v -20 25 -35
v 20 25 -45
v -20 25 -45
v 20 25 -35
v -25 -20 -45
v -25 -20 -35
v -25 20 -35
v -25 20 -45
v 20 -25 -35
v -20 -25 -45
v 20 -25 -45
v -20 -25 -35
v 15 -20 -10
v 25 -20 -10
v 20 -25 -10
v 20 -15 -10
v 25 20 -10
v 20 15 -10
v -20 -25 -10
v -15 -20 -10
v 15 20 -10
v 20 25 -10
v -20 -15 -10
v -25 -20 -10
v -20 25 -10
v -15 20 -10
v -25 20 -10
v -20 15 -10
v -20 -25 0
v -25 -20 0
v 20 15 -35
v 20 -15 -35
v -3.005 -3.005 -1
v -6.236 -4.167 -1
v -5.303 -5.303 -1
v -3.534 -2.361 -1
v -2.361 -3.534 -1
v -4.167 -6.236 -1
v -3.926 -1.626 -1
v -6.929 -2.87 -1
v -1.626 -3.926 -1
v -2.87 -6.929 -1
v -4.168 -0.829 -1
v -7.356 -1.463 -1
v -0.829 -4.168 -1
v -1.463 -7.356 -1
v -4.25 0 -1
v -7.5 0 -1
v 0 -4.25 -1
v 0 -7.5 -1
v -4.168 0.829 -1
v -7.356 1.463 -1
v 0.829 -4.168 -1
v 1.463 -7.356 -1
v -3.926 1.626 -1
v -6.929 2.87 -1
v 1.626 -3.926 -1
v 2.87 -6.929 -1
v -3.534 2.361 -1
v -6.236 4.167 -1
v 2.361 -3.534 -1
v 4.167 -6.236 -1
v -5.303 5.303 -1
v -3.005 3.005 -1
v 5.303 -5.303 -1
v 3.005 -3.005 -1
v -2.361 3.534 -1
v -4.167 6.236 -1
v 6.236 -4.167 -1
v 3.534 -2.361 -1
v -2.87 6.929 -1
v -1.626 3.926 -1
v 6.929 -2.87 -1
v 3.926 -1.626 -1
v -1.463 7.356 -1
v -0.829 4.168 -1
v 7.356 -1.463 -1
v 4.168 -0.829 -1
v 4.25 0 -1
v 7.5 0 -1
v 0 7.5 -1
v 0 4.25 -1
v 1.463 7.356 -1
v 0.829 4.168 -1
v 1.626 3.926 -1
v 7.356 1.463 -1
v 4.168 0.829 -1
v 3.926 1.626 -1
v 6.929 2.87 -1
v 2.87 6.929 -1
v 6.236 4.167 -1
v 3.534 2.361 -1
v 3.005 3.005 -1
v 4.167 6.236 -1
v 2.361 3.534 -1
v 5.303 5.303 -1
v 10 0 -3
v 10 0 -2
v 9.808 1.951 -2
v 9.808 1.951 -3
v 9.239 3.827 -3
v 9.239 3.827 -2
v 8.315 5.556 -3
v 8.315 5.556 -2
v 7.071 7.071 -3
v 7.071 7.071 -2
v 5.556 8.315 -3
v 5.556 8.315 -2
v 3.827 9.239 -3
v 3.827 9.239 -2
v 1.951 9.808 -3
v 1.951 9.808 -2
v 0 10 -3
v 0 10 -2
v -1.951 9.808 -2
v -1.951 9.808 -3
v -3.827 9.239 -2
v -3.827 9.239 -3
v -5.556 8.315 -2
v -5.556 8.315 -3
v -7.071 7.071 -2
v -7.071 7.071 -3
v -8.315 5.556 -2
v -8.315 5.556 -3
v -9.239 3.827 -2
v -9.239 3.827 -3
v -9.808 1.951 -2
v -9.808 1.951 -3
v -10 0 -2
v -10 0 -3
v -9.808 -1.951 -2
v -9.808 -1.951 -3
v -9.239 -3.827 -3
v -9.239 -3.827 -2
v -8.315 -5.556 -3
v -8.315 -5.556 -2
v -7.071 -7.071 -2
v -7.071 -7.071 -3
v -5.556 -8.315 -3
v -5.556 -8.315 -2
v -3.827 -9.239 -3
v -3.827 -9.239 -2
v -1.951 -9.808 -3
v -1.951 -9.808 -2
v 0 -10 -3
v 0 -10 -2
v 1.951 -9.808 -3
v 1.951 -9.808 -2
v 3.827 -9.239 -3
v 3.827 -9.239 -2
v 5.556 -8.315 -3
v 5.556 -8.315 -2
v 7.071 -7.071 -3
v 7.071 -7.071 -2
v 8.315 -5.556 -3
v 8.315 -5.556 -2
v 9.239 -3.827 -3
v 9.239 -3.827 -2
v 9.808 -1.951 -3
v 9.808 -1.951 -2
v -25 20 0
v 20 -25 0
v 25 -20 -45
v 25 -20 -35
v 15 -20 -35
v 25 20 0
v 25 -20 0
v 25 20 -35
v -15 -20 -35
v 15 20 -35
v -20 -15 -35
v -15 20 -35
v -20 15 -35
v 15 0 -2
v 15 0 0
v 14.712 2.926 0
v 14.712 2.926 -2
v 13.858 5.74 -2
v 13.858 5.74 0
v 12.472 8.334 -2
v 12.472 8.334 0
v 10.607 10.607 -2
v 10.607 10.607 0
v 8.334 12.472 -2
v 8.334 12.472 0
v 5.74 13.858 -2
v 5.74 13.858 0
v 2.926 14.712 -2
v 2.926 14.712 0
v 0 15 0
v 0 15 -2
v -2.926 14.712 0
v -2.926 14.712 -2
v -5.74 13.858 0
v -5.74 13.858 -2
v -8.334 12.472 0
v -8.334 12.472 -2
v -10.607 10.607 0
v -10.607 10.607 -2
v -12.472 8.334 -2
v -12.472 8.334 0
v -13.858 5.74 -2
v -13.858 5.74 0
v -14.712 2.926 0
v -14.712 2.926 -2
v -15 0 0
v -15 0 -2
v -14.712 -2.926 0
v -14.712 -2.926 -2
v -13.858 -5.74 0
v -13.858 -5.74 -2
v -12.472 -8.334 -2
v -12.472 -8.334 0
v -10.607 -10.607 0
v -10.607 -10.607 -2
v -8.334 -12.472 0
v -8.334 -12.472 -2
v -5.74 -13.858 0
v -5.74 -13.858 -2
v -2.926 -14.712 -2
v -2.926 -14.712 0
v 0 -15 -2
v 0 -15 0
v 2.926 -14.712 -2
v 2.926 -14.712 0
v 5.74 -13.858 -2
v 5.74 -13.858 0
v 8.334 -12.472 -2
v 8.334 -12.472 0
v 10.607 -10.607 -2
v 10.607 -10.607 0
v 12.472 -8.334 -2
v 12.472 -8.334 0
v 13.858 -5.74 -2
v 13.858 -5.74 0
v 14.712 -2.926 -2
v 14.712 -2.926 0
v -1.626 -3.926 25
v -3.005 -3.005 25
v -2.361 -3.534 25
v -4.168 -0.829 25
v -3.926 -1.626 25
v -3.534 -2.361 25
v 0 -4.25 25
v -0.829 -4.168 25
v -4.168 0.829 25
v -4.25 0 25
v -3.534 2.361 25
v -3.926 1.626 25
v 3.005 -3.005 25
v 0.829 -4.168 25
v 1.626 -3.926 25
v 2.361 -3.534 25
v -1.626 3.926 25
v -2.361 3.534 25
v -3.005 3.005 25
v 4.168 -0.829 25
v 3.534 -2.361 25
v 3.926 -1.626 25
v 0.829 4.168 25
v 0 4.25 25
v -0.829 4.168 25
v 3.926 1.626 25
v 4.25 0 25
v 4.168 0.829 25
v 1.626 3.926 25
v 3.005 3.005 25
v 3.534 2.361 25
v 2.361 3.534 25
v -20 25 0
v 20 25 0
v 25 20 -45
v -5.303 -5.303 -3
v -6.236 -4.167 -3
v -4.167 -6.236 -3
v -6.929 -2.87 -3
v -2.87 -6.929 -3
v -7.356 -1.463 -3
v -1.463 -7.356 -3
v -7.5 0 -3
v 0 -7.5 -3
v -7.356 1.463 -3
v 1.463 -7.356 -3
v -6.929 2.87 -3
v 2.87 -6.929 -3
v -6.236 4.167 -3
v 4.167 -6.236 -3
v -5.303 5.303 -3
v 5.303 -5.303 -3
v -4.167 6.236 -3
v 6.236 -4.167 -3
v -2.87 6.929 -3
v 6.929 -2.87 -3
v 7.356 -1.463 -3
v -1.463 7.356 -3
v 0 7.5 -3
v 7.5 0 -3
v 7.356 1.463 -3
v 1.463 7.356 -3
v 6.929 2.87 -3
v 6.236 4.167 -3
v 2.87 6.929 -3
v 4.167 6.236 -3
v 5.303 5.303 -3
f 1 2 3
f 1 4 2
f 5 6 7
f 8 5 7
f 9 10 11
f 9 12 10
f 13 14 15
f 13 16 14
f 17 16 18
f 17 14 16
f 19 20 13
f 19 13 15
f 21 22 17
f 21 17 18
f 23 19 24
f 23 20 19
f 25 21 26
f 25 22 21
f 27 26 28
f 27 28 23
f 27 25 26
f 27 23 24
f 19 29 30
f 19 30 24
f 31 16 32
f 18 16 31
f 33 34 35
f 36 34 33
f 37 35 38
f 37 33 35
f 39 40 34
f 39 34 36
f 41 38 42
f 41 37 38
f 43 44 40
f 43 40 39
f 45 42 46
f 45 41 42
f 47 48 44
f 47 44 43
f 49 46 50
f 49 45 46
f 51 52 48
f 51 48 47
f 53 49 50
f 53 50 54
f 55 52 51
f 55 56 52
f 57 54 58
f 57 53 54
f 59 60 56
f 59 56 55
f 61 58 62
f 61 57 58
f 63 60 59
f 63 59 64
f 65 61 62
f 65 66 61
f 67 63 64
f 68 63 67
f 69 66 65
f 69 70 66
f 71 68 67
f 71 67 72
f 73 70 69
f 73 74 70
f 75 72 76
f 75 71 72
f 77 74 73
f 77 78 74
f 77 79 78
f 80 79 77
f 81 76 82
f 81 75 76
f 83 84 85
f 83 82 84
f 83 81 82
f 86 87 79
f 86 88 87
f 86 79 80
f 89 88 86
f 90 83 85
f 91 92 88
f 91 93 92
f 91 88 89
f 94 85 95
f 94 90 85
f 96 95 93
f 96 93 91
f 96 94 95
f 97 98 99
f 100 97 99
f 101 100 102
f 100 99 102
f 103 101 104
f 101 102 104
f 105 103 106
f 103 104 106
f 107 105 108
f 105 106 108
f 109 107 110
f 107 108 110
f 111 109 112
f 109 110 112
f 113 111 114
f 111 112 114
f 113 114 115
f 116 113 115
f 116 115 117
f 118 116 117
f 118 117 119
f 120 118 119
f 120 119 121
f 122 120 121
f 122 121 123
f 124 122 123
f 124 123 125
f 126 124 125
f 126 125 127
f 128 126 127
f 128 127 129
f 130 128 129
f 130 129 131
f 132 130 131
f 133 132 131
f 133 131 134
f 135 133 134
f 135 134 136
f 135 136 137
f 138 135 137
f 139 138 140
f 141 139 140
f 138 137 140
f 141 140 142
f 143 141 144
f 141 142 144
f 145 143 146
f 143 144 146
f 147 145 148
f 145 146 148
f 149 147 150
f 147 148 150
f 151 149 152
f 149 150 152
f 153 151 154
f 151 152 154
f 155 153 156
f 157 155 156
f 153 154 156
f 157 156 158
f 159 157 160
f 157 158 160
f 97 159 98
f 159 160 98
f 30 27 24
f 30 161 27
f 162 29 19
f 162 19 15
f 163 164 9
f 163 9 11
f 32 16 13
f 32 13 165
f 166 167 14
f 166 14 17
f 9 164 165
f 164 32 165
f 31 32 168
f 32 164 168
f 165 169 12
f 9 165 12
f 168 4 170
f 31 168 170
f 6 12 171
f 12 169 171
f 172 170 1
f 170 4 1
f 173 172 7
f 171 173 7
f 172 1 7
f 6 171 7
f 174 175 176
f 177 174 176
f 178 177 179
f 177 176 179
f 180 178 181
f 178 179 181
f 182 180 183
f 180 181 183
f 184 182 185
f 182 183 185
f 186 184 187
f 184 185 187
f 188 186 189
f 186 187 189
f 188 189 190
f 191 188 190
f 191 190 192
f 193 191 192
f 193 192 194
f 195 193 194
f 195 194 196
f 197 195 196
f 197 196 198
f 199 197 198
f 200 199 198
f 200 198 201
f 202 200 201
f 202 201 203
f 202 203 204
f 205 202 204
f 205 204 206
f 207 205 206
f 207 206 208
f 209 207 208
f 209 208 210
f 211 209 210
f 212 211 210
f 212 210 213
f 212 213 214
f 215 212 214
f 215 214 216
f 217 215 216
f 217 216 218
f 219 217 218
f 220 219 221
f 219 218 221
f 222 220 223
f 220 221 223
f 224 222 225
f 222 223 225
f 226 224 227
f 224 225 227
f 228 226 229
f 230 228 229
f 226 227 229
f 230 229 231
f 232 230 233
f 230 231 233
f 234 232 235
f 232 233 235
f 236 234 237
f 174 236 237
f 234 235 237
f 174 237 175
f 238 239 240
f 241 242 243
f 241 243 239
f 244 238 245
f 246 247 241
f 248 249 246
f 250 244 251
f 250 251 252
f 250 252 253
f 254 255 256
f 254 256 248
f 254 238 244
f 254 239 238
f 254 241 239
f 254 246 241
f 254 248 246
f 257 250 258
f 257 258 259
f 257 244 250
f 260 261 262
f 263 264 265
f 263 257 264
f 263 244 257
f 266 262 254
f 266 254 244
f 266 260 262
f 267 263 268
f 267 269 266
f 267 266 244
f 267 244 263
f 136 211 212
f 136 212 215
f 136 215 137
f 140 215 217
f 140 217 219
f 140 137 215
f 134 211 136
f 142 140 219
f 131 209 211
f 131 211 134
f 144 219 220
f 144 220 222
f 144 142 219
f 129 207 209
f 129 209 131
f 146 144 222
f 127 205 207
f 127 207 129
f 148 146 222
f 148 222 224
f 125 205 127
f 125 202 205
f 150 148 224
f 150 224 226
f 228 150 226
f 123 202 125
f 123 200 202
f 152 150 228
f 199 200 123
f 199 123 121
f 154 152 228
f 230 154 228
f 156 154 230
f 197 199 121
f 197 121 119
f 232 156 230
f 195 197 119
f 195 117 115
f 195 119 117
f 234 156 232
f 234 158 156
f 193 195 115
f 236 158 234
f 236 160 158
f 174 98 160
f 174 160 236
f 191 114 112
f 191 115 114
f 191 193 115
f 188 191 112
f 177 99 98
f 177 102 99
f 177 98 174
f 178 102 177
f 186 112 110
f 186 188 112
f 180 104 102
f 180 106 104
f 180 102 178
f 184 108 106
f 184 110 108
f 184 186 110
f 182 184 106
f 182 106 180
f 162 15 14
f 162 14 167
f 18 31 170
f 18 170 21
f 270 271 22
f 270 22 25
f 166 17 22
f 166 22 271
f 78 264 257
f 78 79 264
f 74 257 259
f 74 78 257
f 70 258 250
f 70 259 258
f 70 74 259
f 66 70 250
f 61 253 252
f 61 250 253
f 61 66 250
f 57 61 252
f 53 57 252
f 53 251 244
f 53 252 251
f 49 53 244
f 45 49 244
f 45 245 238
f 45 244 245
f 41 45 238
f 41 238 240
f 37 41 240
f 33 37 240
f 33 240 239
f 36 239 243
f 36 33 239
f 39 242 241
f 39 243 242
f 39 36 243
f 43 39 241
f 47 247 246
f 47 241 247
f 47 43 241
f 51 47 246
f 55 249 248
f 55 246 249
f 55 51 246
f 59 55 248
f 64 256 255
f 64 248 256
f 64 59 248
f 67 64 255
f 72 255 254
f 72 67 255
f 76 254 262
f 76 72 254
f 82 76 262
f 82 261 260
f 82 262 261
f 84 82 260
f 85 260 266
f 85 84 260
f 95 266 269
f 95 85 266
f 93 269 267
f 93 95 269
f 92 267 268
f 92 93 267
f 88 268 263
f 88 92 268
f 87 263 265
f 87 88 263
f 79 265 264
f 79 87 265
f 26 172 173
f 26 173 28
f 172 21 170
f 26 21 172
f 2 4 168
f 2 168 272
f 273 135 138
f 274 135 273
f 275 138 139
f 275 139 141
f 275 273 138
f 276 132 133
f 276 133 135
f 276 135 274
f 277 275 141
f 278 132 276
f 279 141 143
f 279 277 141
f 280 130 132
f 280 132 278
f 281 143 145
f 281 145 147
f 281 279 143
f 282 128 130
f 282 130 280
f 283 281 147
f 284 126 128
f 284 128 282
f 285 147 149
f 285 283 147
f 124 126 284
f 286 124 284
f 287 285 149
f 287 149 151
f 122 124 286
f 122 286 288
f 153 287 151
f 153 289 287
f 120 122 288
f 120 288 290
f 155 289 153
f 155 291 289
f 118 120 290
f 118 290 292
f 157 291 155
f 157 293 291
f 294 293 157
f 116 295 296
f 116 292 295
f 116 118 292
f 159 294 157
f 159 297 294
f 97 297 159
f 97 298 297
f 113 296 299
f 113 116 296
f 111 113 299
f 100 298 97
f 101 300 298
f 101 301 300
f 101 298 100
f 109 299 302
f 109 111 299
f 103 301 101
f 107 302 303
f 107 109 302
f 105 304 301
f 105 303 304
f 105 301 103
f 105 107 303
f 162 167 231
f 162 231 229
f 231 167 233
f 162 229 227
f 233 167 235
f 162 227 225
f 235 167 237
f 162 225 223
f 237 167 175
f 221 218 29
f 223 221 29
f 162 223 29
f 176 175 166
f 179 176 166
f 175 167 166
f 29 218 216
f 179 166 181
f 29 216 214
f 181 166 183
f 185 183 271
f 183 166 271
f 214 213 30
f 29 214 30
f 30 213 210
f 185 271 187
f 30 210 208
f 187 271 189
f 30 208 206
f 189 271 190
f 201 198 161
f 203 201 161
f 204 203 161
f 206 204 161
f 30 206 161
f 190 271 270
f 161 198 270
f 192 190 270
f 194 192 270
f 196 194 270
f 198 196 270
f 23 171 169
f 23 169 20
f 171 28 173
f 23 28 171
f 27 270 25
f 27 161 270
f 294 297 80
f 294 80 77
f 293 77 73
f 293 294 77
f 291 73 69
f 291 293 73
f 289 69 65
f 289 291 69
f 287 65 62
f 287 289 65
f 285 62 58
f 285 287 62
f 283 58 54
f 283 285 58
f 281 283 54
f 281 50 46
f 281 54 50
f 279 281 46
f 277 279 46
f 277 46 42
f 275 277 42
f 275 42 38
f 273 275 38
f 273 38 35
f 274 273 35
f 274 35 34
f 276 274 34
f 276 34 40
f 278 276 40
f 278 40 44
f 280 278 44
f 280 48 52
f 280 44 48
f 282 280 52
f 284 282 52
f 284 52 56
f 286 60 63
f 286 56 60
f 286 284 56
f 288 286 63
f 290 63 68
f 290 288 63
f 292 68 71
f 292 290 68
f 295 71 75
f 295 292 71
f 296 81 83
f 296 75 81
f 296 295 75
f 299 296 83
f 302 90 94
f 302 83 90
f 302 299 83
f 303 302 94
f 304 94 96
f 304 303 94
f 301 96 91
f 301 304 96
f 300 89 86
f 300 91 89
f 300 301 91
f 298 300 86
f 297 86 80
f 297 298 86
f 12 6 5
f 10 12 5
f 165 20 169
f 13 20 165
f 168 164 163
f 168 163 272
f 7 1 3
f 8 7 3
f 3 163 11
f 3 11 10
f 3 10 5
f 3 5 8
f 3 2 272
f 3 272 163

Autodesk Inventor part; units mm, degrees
ref_plane "YZ Plane" through (0, 0, 0) normal (1, 0, 0) x (0, 1, 0)
ref_plane "XZ Plane" through (0, 0, 0) normal (0, 1, 0) x (-1, 0, 0)
ref_plane "XY Plane" through (0, 0, 0) normal (0, 0, 1) x (1, 0, 0)
sketch "草图1" plane through (0, 0, 0) normal (0, 0, 1) x (1, 0, 0)
  circle A0 centre (0, 0) radius 4.25
  dimension "d0" = 8.5
extrude "拉伸1" add sketch "草图1" along normal blind 25
sketch "草图2" plane through (0, 0, 0) normal (0, 0, -1) x (-1, 0, 0)
  line L0 (-25, 25) -> (25, 25)
  line L1 (25, 25) -> (25, -25)
  line L2 (25, -25) -> (-25, -25)
  line L3 (-25, -25) -> (-25, 25)
  circle A0 centre (0, 0) radius 4.25 projected
  line L4 (-25, 25) -> (25, -25) construction
  line L5 (25, 25) -> (-25, -25) construction
  dimension "d3" = 50
  dimension "d4" = 50
extrude "拉伸2" add sketch "草图2" along normal blind 10 contours L0 L1 L2 L3 | A0
sketch "草图3" plane through (0, 0, 0) normal (0, 0, 1) x (1, 0, 0)
  circle A0 centre (0, 0) radius 15
  dimension "d7" = 30
extrude "拉伸3" cut sketch "草图3" against normal blind 2
sketch "草图4" plane through (0, 0, -2) normal (0, 0, 1) x (1, 0, 0)
  circle A0 centre (0, 0) radius 10
  dimension "d10" = 20
extrude "拉伸4" cut sketch "草图4" against normal blind 1
sketch "草图5" plane through (0, 0, -3) normal (0, 0, 1) x (1, 0, 0)
  circle A0 centre (0, 0) radius 7.5
  dimension "d13" = 15
extrude "拉伸5" add sketch "草图5" along normal blind 2
sketch "草图6" plane through (0, 0, -1) normal (0, 0, 1) x (1, 0, 0)
  circle A0 centre (0, 0) radius 4.25 projected
extrude "拉伸6" add sketch "草图6" along normal blind 2
sketch "草图7" plane through (0, 0, -10) normal (0, 0, -1) x (-1, 0, 0)
  line L0 (-20, 20) -> (20, 20)
  line L1 (20, 20) -> (20, -20)
  line L2 (20, -20) -> (-20, -20)
  line L3 (-20, -20) -> (-20, 20)
  line L4 (-20, 20) -> (20, -20) construction
  line L5 (20, 20) -> (-20, -20) construction
  point P0 (0, 0)
  dimension "d18" = 40
  dimension "d19" = 40
extrude "拉伸7" add sketch "草图7" along normal blind 25
sketch "草图8" plane through (0, 0, -35) normal (0, 0, -1) x (-1, 0, 0)
  line L0 (25, -25) -> (25, 25) projected
  line L1 (-25, 25) -> (25, 25)
  line L2 (25, 25) -> (25, -25)
  line L3 (25, -25) -> (-25, -25)
  line L4 (-25, -25) -> (-25, 25)
  circle A0 centre (0, 0) radius 7.5 projected
  line L5 (-25, 25) -> (25, -25) construction
  line L6 (25, 25) -> (-25, -25) construction
  dimension "d22" = 50
  dimension "d23" = 50
extrude "拉伸8" add sketch "草图8" along normal blind 10 contours L3 L4 L1 L0 | A0
chamfer "倒角1" distance 5 angle 45 12 edges at (20, -20, -22.5) (25, -25, -5) (25, -25, -40) (-25, -25, -40) (-20, -20, -22.5) (-25, -25, -5) (25, 25, -5) (20, 20, -22.5) (25, 25, -40) (-20, 20, -22.5) (-25, 25, -5) (-25, 25, -40)
properties part number "步进电机2"
